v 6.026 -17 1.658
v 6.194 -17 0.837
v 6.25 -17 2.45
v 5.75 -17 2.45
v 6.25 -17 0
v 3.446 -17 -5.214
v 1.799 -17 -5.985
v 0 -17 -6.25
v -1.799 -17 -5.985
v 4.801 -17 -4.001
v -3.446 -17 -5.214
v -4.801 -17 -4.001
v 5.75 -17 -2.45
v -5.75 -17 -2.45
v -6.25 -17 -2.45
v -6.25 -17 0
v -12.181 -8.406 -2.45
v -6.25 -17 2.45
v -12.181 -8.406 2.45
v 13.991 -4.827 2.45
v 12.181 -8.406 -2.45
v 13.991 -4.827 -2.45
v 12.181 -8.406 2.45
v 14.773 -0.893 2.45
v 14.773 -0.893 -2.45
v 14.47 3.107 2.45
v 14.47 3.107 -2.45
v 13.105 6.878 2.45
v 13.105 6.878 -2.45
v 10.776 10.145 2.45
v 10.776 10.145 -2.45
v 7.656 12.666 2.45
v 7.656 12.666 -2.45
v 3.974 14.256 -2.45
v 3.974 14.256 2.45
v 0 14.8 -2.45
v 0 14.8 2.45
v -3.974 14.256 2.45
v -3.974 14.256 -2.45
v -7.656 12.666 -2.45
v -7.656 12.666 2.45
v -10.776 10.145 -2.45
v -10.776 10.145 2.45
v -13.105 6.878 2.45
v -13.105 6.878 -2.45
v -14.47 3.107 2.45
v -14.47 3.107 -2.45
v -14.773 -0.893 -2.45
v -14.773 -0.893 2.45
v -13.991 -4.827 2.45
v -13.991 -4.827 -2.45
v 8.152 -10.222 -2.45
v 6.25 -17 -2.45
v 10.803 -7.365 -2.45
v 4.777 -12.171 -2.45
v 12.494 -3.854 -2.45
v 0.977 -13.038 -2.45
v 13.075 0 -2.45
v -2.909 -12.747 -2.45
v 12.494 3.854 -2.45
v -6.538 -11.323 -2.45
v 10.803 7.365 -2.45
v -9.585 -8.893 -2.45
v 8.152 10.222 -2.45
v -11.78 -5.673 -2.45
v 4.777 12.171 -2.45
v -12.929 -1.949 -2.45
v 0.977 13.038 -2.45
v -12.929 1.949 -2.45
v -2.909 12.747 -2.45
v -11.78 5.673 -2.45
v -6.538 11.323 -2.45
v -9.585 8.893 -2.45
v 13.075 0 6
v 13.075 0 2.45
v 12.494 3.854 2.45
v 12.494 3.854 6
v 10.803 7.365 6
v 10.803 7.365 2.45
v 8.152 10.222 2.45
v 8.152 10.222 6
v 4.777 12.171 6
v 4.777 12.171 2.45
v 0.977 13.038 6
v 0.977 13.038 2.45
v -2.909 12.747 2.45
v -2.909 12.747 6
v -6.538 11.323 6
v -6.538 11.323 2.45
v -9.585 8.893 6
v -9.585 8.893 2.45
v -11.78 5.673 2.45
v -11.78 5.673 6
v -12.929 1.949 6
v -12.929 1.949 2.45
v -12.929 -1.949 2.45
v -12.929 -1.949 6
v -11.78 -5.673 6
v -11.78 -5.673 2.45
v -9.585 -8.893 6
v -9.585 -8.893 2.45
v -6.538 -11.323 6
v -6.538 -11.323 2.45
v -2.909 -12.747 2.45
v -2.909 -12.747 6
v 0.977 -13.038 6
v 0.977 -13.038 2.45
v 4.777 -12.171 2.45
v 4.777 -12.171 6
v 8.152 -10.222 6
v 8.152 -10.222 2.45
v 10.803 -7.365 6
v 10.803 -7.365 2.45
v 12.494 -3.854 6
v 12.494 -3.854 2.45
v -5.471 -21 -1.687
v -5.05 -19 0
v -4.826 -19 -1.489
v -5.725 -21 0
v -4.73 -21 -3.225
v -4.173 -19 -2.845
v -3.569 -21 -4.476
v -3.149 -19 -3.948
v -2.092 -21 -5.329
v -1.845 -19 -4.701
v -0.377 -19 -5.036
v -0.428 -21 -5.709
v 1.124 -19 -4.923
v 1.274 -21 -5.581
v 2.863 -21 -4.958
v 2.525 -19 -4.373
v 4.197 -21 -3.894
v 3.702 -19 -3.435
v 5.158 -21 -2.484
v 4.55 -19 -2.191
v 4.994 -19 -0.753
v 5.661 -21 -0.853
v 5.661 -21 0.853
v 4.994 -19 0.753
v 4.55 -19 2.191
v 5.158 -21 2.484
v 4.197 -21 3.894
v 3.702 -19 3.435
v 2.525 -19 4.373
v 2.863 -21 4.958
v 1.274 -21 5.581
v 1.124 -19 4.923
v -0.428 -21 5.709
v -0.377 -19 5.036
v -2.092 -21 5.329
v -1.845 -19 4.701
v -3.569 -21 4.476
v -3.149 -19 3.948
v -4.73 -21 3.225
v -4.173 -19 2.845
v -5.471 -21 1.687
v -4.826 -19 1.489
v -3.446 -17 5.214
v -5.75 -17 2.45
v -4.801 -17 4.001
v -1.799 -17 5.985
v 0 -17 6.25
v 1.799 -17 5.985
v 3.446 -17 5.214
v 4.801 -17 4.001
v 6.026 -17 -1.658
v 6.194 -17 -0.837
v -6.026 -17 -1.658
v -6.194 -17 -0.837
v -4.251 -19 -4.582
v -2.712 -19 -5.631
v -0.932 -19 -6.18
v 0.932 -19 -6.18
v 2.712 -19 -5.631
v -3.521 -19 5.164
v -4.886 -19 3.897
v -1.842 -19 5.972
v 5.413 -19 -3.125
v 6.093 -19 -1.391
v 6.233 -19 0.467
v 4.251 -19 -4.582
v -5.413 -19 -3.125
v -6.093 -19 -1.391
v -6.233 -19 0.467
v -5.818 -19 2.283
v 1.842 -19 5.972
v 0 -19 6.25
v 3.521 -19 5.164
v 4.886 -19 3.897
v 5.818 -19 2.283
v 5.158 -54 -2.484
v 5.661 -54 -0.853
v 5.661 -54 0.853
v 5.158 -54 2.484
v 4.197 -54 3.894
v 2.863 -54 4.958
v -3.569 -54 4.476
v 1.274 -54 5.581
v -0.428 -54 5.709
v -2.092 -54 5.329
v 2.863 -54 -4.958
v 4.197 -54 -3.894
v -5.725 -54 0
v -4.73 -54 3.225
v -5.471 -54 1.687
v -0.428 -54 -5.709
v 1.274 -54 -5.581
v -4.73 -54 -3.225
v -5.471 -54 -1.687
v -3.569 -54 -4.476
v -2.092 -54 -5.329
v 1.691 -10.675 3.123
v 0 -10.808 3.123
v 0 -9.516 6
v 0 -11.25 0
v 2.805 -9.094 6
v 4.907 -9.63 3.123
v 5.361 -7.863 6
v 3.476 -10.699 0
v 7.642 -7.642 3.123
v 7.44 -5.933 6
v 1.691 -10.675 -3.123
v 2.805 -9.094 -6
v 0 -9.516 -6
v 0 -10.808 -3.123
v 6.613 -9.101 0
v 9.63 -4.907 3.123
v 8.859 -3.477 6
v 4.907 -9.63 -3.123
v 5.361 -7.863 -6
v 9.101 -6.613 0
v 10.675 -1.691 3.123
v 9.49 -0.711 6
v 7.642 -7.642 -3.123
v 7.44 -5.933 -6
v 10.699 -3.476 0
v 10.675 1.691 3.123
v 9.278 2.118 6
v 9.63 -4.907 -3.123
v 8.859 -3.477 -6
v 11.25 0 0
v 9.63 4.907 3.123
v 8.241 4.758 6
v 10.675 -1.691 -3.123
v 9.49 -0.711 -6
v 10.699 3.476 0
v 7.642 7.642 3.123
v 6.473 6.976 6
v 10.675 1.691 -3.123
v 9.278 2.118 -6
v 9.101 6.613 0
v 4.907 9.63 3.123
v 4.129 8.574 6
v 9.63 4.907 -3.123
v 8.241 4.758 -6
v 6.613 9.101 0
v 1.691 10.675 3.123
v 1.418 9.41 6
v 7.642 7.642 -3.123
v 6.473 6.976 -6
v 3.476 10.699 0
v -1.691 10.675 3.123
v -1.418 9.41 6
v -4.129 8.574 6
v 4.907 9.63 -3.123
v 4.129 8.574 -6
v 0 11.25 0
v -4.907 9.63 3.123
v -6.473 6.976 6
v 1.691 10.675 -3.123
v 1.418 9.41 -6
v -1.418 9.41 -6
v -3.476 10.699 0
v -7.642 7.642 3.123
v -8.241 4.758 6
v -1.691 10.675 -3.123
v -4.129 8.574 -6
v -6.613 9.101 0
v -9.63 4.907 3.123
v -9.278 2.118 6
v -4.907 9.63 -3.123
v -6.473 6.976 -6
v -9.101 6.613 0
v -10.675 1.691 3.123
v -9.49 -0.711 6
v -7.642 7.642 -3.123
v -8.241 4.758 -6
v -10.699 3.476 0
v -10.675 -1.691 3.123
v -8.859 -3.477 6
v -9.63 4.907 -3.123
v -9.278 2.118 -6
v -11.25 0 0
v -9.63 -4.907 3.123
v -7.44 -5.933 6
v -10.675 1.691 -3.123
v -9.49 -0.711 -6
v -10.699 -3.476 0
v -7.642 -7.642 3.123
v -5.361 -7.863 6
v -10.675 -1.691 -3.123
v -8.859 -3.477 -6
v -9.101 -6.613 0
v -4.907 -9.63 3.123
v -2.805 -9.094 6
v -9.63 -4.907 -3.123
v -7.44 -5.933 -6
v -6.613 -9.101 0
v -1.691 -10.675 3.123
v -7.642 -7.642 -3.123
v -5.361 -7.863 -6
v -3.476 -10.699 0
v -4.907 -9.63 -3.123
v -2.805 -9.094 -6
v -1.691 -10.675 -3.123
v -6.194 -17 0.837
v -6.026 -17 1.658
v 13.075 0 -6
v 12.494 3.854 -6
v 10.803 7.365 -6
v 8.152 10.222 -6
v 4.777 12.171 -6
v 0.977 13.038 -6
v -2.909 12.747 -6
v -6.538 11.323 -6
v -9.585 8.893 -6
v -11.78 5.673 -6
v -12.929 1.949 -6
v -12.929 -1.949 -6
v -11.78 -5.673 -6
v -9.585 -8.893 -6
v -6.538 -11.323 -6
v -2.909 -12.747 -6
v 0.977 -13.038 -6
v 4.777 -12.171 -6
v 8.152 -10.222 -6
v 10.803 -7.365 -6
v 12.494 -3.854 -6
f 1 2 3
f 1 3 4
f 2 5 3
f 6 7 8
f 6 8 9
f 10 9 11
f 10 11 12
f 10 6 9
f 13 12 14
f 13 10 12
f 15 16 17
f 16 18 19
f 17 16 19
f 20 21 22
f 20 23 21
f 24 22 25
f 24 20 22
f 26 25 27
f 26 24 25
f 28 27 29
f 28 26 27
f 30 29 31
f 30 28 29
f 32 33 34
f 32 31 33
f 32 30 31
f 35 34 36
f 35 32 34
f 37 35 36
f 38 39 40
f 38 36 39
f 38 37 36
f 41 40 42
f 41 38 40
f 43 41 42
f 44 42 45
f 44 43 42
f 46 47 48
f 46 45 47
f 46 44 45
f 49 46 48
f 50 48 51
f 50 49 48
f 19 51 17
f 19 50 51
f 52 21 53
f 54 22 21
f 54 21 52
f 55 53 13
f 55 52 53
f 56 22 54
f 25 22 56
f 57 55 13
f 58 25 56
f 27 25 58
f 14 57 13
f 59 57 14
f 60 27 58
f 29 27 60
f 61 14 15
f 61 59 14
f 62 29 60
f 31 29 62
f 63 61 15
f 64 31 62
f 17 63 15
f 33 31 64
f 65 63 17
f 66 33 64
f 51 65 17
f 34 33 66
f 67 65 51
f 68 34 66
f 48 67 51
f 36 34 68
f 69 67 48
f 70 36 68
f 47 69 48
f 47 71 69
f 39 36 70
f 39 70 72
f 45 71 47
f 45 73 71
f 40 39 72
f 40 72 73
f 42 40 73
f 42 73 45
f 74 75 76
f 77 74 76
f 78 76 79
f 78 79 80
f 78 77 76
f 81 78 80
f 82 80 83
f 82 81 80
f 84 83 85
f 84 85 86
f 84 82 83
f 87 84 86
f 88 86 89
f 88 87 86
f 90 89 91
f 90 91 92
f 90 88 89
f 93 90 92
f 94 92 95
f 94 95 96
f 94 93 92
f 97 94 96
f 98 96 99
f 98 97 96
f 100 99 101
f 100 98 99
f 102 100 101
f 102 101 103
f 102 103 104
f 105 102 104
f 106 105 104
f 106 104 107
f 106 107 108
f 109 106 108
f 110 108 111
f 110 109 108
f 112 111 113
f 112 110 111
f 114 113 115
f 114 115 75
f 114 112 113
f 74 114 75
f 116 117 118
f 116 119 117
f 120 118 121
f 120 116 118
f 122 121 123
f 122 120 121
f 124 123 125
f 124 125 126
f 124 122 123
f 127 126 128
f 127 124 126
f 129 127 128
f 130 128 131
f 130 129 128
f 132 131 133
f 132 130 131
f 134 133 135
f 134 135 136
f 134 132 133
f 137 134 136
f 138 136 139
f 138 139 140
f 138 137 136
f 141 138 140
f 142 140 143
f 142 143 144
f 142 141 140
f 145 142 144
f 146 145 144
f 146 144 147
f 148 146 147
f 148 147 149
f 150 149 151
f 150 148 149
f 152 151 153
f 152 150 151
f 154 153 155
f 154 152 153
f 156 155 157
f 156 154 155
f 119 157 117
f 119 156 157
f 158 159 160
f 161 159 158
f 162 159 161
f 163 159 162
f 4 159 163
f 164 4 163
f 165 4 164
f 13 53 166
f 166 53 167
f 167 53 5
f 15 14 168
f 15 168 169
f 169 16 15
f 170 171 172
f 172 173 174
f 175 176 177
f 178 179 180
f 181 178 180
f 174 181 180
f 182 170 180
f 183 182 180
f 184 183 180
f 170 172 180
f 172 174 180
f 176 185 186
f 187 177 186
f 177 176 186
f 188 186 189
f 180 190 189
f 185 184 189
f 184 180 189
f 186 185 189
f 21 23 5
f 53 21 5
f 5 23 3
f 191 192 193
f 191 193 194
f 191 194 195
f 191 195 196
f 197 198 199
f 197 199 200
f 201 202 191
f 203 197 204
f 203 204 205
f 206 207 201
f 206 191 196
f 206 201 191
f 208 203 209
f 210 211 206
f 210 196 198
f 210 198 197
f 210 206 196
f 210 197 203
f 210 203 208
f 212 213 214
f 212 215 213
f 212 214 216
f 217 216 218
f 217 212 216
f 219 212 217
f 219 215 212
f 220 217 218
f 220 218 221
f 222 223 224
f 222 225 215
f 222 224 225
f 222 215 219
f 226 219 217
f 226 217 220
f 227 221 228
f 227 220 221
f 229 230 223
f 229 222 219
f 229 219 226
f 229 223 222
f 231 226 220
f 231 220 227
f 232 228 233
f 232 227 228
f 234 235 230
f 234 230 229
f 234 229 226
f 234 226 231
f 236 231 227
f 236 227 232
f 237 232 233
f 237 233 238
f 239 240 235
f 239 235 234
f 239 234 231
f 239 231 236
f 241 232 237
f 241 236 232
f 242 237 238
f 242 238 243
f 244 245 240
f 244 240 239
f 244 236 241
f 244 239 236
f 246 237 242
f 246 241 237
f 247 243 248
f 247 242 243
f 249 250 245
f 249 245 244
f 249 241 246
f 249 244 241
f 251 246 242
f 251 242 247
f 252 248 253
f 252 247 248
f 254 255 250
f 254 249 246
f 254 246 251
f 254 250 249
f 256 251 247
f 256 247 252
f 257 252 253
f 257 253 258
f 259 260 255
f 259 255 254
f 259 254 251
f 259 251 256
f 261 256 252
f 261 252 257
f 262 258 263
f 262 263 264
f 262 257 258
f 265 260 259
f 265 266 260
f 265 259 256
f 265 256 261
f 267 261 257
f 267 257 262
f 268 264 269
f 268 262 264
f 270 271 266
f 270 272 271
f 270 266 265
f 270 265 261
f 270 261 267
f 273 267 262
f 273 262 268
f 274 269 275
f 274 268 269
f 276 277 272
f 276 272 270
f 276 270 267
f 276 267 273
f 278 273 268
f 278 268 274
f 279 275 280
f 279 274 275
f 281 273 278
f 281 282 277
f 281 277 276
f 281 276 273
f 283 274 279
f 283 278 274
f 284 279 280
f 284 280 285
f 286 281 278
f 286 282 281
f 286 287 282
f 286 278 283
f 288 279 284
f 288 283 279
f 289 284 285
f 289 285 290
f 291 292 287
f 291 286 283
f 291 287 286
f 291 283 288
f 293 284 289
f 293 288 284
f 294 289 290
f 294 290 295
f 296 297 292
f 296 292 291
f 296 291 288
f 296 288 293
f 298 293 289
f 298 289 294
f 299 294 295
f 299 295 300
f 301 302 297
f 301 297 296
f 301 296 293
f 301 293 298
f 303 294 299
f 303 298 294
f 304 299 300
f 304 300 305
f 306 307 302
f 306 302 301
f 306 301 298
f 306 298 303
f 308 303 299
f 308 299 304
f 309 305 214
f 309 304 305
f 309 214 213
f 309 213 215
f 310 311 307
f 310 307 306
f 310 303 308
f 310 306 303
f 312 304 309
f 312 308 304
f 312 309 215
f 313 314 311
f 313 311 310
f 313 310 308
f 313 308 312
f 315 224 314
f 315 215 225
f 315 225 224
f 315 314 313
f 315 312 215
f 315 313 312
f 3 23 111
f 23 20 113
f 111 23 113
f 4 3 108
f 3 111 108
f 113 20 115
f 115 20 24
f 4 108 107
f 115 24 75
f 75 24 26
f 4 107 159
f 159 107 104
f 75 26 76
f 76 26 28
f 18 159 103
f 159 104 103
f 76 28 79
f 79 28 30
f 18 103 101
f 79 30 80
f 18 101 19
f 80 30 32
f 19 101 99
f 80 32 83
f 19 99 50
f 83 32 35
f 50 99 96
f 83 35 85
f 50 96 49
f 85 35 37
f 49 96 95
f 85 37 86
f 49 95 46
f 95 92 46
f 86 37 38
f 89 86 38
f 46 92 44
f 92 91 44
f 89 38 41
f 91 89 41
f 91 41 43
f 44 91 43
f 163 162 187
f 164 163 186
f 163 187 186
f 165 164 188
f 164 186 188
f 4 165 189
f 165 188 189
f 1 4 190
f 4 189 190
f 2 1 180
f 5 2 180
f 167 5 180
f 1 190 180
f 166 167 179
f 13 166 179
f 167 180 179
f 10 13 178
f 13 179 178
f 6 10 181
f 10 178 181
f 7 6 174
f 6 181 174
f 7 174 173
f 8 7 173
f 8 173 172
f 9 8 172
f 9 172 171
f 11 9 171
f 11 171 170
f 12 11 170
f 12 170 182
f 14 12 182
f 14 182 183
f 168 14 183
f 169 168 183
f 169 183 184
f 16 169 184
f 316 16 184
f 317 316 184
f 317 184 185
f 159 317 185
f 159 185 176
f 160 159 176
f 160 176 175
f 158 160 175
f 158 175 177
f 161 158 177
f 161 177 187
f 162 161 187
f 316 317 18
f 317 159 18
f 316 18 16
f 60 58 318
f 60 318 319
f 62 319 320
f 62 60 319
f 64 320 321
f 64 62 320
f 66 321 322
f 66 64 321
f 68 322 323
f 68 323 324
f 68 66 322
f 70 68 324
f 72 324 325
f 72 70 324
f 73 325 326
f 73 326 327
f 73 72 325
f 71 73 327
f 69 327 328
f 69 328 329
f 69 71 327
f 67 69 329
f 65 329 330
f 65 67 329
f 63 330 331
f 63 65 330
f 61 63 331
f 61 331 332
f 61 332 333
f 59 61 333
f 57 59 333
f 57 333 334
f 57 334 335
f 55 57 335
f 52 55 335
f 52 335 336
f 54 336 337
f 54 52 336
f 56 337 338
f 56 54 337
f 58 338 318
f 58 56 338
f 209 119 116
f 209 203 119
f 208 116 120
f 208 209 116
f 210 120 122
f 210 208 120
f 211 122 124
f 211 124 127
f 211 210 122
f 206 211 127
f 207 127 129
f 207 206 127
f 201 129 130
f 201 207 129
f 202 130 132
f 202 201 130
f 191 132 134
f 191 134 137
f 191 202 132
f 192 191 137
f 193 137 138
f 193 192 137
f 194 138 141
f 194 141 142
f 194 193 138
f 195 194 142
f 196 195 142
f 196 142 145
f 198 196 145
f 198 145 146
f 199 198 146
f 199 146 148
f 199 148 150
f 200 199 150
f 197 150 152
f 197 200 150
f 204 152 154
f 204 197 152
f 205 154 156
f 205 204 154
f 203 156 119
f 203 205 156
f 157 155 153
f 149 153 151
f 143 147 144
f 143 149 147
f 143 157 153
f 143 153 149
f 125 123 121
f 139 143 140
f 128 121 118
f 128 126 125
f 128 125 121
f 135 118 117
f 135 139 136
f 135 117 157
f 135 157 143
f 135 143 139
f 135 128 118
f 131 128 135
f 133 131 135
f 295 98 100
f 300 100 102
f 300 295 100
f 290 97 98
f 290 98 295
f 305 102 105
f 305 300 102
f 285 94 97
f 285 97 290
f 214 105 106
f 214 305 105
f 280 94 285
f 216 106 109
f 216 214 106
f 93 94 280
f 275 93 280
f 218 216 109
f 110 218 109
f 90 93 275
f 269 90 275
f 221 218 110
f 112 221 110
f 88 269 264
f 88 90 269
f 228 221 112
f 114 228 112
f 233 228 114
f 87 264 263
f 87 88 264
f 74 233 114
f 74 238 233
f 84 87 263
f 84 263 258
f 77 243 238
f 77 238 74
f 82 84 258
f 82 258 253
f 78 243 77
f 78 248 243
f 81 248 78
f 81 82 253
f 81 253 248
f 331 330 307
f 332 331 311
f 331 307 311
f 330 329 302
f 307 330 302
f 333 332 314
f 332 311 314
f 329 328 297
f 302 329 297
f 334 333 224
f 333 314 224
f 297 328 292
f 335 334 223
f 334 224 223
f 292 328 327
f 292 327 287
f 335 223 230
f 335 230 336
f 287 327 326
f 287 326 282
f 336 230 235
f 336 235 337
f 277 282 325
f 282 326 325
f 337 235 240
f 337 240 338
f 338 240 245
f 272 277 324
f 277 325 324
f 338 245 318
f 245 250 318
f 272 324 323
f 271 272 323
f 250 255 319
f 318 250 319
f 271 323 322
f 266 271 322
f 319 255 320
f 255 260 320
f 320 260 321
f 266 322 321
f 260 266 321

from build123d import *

# Parameters (mm, degrees)
SKETCH_1_R      = 13.075
EXTRUDE_1_DEPTH = 6
SKETCH_1_4_R    = 13.075
EXTRUDE_2_DEPTH = 2.45
SKETCH_3_R      = 6.25
EXTRUDE_5_DEPTH = 2
EXTRUDE_6_DEPTH = 2.45


with BuildPart() as part:
    # 스케치1 → 보스-돌출1 (new, symmetric)
    with BuildSketch(Plane.XY):
        Circle(SKETCH_1_R)
    extrude(amount=EXTRUDE_1_DEPTH, both=True)

    # 스케치1<4> → 보스-돌출2 (add, symmetric)
    with BuildSketch(Plane.XY):
        with BuildLine():
            ThreePointArc((14.8, 0), (0, 14.8), (-14.8, 0))
            ThreePointArc((-14.8, 0), (0, -14.8), (14.8, 0))
        make_face()
        Circle(SKETCH_1_4_R, mode=Mode.SUBTRACT)
    extrude(amount=EXTRUDE_2_DEPTH, both=True)

    # 스케치6 → 컷-회전6 (revolve, cut)
    with BuildSketch(Plane(origin=(0, 0, 0), x_dir=(0, 0, -1), z_dir=(1, 0, 0))):
        with BuildLine():
            Line((-11.25, 0), (11.25, 0))
            ThreePointArc((11.25, 0), (0, 11.25), (-11.25, 0))
        make_face()
    revolve(axis=Axis((0, 0, -11.25), (0, 0, 1)), mode=Mode.SUBTRACT)



with BuildPart() as body_2:
    # 스케치3 → 보스-돌출5 (new body)
    with BuildSketch(Plane(origin=(0, -19, 0), x_dir=(1, 0, 0), z_dir=(0, 1, 0))):
        Circle(SKETCH_3_R)
    extrude(amount=EXTRUDE_5_DEPTH)


with BuildPart() as body_3:
    # 스케치4 → 회전1 (revolve)
    with BuildSketch(Plane.XY):
        Polygon((0, -19), (5.05, -19), (5.725, -21), (5.725, -54), (0, -54), align=None)
    revolve(axis=Axis((0, -19, 0), (0, -1, 0)))


with BuildPart() as part_1:
    add(part.part)

    add(body_2.part)  # 보스-돌출6 merges body 2
    # 스케치7 → 보스-돌출6 (add, symmetric)
    with BuildSketch(Plane.XY):
        with BuildLine():
            Line((6.25, -17), (-6.25, -17))
            Line((-6.25, -17), (-12.180764996, -8.406483457))
            ThreePointArc((-12.180764996, -8.406483457), (0, -14.8), (12.180764996, -8.406483457))
            Line((12.180764996, -8.406483457), (6.25, -17))
        make_face()
    extrude(amount=EXTRUDE_6_DEPTH, both=True)


solid = Compound([body_3.part, part_1.part])
